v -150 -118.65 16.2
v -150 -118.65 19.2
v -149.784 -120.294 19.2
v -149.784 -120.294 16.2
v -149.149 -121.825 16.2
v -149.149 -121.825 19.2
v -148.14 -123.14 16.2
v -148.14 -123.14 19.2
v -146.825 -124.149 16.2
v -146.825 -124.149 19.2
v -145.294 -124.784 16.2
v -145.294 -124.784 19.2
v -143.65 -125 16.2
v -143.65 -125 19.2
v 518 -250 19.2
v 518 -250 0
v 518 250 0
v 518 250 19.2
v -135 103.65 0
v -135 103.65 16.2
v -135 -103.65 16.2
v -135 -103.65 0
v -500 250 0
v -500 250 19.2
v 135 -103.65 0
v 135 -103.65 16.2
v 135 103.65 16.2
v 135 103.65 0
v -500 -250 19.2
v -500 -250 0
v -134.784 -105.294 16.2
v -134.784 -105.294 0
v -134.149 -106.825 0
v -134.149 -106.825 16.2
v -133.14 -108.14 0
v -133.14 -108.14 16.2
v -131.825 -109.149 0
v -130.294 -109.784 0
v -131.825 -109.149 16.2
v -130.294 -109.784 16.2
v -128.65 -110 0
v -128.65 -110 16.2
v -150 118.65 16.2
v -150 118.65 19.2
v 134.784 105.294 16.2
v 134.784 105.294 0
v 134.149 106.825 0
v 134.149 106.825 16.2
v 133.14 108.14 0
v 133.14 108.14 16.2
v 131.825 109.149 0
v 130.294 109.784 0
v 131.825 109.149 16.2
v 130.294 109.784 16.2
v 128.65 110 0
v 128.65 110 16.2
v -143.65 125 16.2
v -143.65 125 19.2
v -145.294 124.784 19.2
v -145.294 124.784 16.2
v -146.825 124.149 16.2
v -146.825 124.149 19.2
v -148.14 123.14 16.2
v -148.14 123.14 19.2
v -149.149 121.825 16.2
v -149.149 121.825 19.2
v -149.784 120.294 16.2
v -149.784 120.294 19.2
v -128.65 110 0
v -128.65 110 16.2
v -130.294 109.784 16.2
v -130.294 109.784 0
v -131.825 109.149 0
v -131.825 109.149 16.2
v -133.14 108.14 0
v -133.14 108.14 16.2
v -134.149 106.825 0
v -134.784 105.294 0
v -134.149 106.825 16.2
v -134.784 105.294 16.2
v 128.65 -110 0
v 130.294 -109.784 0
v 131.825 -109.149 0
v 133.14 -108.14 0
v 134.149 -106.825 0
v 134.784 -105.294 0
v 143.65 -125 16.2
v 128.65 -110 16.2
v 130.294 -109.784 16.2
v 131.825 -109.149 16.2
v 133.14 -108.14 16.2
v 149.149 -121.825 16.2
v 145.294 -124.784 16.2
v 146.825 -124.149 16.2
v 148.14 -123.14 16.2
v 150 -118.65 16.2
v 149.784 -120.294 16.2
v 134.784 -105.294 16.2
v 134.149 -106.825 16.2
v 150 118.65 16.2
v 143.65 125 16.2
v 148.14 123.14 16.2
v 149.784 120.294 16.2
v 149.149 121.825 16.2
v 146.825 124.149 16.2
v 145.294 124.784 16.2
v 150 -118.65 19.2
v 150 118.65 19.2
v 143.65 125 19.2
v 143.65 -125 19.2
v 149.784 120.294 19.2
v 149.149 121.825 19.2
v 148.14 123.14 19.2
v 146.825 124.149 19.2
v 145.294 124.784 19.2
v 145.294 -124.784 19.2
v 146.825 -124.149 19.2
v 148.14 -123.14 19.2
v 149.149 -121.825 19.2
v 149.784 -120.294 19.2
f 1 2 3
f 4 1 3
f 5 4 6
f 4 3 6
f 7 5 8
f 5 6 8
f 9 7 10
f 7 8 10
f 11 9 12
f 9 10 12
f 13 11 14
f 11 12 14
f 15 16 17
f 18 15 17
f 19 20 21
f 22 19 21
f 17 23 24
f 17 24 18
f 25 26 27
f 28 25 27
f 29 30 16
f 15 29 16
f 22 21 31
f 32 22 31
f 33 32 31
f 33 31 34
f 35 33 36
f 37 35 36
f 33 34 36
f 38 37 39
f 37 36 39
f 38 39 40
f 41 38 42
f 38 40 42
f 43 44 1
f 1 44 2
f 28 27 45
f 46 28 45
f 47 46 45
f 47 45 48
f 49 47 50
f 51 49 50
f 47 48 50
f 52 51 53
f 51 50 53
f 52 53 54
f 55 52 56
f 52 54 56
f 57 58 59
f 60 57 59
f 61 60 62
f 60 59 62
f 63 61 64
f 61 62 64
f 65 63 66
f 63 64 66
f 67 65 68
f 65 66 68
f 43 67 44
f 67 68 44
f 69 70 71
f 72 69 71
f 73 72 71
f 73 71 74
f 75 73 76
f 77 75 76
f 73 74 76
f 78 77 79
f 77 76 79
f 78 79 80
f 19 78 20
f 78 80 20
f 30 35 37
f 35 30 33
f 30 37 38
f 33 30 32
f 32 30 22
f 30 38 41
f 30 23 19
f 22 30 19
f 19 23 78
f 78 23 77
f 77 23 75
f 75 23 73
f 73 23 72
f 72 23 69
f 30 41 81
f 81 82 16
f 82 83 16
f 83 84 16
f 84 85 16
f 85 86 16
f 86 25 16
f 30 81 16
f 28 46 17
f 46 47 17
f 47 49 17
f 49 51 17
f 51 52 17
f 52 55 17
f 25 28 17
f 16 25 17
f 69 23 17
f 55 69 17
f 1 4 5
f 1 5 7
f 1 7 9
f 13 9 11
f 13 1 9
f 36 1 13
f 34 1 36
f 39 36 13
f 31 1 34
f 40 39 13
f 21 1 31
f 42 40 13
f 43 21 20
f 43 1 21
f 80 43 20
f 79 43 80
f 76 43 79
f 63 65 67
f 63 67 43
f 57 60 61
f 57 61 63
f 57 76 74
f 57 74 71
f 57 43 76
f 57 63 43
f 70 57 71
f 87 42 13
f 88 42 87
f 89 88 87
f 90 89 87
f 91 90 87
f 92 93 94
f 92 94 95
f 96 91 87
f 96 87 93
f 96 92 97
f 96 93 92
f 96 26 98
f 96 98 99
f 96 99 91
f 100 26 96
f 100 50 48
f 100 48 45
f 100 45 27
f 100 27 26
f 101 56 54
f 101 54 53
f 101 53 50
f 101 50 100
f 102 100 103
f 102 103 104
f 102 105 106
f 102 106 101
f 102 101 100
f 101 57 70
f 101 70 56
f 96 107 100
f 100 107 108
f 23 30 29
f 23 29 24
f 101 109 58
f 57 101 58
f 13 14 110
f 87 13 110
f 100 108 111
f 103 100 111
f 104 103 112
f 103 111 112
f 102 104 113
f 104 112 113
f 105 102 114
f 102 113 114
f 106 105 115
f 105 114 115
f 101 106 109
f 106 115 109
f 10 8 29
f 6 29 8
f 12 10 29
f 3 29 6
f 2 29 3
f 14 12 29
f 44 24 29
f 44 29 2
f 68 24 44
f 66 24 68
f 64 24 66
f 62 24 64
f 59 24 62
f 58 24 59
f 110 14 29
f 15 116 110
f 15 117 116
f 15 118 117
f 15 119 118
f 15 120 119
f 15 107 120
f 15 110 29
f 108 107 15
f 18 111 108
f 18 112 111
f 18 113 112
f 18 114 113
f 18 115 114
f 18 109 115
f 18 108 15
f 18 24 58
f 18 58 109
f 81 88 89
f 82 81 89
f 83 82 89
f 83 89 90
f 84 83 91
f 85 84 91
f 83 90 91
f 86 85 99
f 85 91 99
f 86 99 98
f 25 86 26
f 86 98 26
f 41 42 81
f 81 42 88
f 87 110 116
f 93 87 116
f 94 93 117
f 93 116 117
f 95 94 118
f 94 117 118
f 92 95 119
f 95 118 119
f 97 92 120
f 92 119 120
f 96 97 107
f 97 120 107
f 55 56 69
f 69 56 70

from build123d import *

# Parameters (mm, degrees)
F0_W     = 1018
F0_H     = 500
F1_DEPTH = 19.2
F3_DEPTH = 3
F4_DEPTH = 19.2


with BuildPart() as f1:
    # F0 (on Top) → F1 (new body)
    with BuildSketch(Plane.XY):
        with Locations((9, 0)):
            Rectangle(F0_W, F0_H)
    extrude(amount=F1_DEPTH)

    # F2 (on face) → F3 (cut)
    with BuildSketch(Plane.XY.offset(19.2)):
        with BuildLine():
            ThreePointArc((150, 118.65), (148.140128, 123.140128), (143.65, 125))
            Line((143.65, 125), (-143.65, 125))
            ThreePointArc((-143.65, 125), (-148.140128, 123.140128), (-150, 118.65))
            Line((-150, 118.65), (-150, -118.65))
            ThreePointArc((-150, -118.65), (-148.140128, -123.140128), (-143.65, -125))
            Line((-143.65, -125), (143.65, -125))
            ThreePointArc((143.65, -125), (148.140128, -123.140128), (150, -118.65))
            Line((150, -118.65), (150, 118.65))
        make_face()
        with BuildLine():
            Line((-135, -103.65), (-135, 103.65))
            ThreePointArc((-135, 103.65), (-133.140128, 108.140128), (-128.65, 110))
            Line((-128.65, 110), (128.65, 110))
            ThreePointArc((128.65, 110), (133.140128, 108.140128), (135, 103.65))
            Line((135, 103.65), (135, -103.65))
            ThreePointArc((135, -103.65), (133.140128, -108.140128), (128.65, -110))
            Line((128.65, -110), (-128.65, -110))
            ThreePointArc((-128.65, -110), (-133.140128, -108.140128), (-135, -103.65))
        make_face(mode=Mode.SUBTRACT)
    extrude(amount=-F3_DEPTH, mode=Mode.SUBTRACT)

    # F2 (on face) → F4 (cut, through all)
    with BuildSketch(Plane.XY.offset(19.2)):
        with BuildLine():
            ThreePointArc((-128.65, 110), (-133.140128, 108.140128), (-135, 103.65))
            Line((-135, 103.65), (-135, -103.65))
            ThreePointArc((-135, -103.65), (-133.140128, -108.140128), (-128.65, -110))
            Line((-128.65, -110), (128.65, -110))
            ThreePointArc((128.65, -110), (133.140128, -108.140128), (135, -103.65))
            Line((135, -103.65), (135, 103.65))
            ThreePointArc((135, 103.65), (133.140128, 108.140128), (128.65, 110))
            Line((128.65, 110), (-128.65, 110))
        make_face()
    extrude(amount=-F4_DEPTH, mode=Mode.SUBTRACT)


solid = f1.part
